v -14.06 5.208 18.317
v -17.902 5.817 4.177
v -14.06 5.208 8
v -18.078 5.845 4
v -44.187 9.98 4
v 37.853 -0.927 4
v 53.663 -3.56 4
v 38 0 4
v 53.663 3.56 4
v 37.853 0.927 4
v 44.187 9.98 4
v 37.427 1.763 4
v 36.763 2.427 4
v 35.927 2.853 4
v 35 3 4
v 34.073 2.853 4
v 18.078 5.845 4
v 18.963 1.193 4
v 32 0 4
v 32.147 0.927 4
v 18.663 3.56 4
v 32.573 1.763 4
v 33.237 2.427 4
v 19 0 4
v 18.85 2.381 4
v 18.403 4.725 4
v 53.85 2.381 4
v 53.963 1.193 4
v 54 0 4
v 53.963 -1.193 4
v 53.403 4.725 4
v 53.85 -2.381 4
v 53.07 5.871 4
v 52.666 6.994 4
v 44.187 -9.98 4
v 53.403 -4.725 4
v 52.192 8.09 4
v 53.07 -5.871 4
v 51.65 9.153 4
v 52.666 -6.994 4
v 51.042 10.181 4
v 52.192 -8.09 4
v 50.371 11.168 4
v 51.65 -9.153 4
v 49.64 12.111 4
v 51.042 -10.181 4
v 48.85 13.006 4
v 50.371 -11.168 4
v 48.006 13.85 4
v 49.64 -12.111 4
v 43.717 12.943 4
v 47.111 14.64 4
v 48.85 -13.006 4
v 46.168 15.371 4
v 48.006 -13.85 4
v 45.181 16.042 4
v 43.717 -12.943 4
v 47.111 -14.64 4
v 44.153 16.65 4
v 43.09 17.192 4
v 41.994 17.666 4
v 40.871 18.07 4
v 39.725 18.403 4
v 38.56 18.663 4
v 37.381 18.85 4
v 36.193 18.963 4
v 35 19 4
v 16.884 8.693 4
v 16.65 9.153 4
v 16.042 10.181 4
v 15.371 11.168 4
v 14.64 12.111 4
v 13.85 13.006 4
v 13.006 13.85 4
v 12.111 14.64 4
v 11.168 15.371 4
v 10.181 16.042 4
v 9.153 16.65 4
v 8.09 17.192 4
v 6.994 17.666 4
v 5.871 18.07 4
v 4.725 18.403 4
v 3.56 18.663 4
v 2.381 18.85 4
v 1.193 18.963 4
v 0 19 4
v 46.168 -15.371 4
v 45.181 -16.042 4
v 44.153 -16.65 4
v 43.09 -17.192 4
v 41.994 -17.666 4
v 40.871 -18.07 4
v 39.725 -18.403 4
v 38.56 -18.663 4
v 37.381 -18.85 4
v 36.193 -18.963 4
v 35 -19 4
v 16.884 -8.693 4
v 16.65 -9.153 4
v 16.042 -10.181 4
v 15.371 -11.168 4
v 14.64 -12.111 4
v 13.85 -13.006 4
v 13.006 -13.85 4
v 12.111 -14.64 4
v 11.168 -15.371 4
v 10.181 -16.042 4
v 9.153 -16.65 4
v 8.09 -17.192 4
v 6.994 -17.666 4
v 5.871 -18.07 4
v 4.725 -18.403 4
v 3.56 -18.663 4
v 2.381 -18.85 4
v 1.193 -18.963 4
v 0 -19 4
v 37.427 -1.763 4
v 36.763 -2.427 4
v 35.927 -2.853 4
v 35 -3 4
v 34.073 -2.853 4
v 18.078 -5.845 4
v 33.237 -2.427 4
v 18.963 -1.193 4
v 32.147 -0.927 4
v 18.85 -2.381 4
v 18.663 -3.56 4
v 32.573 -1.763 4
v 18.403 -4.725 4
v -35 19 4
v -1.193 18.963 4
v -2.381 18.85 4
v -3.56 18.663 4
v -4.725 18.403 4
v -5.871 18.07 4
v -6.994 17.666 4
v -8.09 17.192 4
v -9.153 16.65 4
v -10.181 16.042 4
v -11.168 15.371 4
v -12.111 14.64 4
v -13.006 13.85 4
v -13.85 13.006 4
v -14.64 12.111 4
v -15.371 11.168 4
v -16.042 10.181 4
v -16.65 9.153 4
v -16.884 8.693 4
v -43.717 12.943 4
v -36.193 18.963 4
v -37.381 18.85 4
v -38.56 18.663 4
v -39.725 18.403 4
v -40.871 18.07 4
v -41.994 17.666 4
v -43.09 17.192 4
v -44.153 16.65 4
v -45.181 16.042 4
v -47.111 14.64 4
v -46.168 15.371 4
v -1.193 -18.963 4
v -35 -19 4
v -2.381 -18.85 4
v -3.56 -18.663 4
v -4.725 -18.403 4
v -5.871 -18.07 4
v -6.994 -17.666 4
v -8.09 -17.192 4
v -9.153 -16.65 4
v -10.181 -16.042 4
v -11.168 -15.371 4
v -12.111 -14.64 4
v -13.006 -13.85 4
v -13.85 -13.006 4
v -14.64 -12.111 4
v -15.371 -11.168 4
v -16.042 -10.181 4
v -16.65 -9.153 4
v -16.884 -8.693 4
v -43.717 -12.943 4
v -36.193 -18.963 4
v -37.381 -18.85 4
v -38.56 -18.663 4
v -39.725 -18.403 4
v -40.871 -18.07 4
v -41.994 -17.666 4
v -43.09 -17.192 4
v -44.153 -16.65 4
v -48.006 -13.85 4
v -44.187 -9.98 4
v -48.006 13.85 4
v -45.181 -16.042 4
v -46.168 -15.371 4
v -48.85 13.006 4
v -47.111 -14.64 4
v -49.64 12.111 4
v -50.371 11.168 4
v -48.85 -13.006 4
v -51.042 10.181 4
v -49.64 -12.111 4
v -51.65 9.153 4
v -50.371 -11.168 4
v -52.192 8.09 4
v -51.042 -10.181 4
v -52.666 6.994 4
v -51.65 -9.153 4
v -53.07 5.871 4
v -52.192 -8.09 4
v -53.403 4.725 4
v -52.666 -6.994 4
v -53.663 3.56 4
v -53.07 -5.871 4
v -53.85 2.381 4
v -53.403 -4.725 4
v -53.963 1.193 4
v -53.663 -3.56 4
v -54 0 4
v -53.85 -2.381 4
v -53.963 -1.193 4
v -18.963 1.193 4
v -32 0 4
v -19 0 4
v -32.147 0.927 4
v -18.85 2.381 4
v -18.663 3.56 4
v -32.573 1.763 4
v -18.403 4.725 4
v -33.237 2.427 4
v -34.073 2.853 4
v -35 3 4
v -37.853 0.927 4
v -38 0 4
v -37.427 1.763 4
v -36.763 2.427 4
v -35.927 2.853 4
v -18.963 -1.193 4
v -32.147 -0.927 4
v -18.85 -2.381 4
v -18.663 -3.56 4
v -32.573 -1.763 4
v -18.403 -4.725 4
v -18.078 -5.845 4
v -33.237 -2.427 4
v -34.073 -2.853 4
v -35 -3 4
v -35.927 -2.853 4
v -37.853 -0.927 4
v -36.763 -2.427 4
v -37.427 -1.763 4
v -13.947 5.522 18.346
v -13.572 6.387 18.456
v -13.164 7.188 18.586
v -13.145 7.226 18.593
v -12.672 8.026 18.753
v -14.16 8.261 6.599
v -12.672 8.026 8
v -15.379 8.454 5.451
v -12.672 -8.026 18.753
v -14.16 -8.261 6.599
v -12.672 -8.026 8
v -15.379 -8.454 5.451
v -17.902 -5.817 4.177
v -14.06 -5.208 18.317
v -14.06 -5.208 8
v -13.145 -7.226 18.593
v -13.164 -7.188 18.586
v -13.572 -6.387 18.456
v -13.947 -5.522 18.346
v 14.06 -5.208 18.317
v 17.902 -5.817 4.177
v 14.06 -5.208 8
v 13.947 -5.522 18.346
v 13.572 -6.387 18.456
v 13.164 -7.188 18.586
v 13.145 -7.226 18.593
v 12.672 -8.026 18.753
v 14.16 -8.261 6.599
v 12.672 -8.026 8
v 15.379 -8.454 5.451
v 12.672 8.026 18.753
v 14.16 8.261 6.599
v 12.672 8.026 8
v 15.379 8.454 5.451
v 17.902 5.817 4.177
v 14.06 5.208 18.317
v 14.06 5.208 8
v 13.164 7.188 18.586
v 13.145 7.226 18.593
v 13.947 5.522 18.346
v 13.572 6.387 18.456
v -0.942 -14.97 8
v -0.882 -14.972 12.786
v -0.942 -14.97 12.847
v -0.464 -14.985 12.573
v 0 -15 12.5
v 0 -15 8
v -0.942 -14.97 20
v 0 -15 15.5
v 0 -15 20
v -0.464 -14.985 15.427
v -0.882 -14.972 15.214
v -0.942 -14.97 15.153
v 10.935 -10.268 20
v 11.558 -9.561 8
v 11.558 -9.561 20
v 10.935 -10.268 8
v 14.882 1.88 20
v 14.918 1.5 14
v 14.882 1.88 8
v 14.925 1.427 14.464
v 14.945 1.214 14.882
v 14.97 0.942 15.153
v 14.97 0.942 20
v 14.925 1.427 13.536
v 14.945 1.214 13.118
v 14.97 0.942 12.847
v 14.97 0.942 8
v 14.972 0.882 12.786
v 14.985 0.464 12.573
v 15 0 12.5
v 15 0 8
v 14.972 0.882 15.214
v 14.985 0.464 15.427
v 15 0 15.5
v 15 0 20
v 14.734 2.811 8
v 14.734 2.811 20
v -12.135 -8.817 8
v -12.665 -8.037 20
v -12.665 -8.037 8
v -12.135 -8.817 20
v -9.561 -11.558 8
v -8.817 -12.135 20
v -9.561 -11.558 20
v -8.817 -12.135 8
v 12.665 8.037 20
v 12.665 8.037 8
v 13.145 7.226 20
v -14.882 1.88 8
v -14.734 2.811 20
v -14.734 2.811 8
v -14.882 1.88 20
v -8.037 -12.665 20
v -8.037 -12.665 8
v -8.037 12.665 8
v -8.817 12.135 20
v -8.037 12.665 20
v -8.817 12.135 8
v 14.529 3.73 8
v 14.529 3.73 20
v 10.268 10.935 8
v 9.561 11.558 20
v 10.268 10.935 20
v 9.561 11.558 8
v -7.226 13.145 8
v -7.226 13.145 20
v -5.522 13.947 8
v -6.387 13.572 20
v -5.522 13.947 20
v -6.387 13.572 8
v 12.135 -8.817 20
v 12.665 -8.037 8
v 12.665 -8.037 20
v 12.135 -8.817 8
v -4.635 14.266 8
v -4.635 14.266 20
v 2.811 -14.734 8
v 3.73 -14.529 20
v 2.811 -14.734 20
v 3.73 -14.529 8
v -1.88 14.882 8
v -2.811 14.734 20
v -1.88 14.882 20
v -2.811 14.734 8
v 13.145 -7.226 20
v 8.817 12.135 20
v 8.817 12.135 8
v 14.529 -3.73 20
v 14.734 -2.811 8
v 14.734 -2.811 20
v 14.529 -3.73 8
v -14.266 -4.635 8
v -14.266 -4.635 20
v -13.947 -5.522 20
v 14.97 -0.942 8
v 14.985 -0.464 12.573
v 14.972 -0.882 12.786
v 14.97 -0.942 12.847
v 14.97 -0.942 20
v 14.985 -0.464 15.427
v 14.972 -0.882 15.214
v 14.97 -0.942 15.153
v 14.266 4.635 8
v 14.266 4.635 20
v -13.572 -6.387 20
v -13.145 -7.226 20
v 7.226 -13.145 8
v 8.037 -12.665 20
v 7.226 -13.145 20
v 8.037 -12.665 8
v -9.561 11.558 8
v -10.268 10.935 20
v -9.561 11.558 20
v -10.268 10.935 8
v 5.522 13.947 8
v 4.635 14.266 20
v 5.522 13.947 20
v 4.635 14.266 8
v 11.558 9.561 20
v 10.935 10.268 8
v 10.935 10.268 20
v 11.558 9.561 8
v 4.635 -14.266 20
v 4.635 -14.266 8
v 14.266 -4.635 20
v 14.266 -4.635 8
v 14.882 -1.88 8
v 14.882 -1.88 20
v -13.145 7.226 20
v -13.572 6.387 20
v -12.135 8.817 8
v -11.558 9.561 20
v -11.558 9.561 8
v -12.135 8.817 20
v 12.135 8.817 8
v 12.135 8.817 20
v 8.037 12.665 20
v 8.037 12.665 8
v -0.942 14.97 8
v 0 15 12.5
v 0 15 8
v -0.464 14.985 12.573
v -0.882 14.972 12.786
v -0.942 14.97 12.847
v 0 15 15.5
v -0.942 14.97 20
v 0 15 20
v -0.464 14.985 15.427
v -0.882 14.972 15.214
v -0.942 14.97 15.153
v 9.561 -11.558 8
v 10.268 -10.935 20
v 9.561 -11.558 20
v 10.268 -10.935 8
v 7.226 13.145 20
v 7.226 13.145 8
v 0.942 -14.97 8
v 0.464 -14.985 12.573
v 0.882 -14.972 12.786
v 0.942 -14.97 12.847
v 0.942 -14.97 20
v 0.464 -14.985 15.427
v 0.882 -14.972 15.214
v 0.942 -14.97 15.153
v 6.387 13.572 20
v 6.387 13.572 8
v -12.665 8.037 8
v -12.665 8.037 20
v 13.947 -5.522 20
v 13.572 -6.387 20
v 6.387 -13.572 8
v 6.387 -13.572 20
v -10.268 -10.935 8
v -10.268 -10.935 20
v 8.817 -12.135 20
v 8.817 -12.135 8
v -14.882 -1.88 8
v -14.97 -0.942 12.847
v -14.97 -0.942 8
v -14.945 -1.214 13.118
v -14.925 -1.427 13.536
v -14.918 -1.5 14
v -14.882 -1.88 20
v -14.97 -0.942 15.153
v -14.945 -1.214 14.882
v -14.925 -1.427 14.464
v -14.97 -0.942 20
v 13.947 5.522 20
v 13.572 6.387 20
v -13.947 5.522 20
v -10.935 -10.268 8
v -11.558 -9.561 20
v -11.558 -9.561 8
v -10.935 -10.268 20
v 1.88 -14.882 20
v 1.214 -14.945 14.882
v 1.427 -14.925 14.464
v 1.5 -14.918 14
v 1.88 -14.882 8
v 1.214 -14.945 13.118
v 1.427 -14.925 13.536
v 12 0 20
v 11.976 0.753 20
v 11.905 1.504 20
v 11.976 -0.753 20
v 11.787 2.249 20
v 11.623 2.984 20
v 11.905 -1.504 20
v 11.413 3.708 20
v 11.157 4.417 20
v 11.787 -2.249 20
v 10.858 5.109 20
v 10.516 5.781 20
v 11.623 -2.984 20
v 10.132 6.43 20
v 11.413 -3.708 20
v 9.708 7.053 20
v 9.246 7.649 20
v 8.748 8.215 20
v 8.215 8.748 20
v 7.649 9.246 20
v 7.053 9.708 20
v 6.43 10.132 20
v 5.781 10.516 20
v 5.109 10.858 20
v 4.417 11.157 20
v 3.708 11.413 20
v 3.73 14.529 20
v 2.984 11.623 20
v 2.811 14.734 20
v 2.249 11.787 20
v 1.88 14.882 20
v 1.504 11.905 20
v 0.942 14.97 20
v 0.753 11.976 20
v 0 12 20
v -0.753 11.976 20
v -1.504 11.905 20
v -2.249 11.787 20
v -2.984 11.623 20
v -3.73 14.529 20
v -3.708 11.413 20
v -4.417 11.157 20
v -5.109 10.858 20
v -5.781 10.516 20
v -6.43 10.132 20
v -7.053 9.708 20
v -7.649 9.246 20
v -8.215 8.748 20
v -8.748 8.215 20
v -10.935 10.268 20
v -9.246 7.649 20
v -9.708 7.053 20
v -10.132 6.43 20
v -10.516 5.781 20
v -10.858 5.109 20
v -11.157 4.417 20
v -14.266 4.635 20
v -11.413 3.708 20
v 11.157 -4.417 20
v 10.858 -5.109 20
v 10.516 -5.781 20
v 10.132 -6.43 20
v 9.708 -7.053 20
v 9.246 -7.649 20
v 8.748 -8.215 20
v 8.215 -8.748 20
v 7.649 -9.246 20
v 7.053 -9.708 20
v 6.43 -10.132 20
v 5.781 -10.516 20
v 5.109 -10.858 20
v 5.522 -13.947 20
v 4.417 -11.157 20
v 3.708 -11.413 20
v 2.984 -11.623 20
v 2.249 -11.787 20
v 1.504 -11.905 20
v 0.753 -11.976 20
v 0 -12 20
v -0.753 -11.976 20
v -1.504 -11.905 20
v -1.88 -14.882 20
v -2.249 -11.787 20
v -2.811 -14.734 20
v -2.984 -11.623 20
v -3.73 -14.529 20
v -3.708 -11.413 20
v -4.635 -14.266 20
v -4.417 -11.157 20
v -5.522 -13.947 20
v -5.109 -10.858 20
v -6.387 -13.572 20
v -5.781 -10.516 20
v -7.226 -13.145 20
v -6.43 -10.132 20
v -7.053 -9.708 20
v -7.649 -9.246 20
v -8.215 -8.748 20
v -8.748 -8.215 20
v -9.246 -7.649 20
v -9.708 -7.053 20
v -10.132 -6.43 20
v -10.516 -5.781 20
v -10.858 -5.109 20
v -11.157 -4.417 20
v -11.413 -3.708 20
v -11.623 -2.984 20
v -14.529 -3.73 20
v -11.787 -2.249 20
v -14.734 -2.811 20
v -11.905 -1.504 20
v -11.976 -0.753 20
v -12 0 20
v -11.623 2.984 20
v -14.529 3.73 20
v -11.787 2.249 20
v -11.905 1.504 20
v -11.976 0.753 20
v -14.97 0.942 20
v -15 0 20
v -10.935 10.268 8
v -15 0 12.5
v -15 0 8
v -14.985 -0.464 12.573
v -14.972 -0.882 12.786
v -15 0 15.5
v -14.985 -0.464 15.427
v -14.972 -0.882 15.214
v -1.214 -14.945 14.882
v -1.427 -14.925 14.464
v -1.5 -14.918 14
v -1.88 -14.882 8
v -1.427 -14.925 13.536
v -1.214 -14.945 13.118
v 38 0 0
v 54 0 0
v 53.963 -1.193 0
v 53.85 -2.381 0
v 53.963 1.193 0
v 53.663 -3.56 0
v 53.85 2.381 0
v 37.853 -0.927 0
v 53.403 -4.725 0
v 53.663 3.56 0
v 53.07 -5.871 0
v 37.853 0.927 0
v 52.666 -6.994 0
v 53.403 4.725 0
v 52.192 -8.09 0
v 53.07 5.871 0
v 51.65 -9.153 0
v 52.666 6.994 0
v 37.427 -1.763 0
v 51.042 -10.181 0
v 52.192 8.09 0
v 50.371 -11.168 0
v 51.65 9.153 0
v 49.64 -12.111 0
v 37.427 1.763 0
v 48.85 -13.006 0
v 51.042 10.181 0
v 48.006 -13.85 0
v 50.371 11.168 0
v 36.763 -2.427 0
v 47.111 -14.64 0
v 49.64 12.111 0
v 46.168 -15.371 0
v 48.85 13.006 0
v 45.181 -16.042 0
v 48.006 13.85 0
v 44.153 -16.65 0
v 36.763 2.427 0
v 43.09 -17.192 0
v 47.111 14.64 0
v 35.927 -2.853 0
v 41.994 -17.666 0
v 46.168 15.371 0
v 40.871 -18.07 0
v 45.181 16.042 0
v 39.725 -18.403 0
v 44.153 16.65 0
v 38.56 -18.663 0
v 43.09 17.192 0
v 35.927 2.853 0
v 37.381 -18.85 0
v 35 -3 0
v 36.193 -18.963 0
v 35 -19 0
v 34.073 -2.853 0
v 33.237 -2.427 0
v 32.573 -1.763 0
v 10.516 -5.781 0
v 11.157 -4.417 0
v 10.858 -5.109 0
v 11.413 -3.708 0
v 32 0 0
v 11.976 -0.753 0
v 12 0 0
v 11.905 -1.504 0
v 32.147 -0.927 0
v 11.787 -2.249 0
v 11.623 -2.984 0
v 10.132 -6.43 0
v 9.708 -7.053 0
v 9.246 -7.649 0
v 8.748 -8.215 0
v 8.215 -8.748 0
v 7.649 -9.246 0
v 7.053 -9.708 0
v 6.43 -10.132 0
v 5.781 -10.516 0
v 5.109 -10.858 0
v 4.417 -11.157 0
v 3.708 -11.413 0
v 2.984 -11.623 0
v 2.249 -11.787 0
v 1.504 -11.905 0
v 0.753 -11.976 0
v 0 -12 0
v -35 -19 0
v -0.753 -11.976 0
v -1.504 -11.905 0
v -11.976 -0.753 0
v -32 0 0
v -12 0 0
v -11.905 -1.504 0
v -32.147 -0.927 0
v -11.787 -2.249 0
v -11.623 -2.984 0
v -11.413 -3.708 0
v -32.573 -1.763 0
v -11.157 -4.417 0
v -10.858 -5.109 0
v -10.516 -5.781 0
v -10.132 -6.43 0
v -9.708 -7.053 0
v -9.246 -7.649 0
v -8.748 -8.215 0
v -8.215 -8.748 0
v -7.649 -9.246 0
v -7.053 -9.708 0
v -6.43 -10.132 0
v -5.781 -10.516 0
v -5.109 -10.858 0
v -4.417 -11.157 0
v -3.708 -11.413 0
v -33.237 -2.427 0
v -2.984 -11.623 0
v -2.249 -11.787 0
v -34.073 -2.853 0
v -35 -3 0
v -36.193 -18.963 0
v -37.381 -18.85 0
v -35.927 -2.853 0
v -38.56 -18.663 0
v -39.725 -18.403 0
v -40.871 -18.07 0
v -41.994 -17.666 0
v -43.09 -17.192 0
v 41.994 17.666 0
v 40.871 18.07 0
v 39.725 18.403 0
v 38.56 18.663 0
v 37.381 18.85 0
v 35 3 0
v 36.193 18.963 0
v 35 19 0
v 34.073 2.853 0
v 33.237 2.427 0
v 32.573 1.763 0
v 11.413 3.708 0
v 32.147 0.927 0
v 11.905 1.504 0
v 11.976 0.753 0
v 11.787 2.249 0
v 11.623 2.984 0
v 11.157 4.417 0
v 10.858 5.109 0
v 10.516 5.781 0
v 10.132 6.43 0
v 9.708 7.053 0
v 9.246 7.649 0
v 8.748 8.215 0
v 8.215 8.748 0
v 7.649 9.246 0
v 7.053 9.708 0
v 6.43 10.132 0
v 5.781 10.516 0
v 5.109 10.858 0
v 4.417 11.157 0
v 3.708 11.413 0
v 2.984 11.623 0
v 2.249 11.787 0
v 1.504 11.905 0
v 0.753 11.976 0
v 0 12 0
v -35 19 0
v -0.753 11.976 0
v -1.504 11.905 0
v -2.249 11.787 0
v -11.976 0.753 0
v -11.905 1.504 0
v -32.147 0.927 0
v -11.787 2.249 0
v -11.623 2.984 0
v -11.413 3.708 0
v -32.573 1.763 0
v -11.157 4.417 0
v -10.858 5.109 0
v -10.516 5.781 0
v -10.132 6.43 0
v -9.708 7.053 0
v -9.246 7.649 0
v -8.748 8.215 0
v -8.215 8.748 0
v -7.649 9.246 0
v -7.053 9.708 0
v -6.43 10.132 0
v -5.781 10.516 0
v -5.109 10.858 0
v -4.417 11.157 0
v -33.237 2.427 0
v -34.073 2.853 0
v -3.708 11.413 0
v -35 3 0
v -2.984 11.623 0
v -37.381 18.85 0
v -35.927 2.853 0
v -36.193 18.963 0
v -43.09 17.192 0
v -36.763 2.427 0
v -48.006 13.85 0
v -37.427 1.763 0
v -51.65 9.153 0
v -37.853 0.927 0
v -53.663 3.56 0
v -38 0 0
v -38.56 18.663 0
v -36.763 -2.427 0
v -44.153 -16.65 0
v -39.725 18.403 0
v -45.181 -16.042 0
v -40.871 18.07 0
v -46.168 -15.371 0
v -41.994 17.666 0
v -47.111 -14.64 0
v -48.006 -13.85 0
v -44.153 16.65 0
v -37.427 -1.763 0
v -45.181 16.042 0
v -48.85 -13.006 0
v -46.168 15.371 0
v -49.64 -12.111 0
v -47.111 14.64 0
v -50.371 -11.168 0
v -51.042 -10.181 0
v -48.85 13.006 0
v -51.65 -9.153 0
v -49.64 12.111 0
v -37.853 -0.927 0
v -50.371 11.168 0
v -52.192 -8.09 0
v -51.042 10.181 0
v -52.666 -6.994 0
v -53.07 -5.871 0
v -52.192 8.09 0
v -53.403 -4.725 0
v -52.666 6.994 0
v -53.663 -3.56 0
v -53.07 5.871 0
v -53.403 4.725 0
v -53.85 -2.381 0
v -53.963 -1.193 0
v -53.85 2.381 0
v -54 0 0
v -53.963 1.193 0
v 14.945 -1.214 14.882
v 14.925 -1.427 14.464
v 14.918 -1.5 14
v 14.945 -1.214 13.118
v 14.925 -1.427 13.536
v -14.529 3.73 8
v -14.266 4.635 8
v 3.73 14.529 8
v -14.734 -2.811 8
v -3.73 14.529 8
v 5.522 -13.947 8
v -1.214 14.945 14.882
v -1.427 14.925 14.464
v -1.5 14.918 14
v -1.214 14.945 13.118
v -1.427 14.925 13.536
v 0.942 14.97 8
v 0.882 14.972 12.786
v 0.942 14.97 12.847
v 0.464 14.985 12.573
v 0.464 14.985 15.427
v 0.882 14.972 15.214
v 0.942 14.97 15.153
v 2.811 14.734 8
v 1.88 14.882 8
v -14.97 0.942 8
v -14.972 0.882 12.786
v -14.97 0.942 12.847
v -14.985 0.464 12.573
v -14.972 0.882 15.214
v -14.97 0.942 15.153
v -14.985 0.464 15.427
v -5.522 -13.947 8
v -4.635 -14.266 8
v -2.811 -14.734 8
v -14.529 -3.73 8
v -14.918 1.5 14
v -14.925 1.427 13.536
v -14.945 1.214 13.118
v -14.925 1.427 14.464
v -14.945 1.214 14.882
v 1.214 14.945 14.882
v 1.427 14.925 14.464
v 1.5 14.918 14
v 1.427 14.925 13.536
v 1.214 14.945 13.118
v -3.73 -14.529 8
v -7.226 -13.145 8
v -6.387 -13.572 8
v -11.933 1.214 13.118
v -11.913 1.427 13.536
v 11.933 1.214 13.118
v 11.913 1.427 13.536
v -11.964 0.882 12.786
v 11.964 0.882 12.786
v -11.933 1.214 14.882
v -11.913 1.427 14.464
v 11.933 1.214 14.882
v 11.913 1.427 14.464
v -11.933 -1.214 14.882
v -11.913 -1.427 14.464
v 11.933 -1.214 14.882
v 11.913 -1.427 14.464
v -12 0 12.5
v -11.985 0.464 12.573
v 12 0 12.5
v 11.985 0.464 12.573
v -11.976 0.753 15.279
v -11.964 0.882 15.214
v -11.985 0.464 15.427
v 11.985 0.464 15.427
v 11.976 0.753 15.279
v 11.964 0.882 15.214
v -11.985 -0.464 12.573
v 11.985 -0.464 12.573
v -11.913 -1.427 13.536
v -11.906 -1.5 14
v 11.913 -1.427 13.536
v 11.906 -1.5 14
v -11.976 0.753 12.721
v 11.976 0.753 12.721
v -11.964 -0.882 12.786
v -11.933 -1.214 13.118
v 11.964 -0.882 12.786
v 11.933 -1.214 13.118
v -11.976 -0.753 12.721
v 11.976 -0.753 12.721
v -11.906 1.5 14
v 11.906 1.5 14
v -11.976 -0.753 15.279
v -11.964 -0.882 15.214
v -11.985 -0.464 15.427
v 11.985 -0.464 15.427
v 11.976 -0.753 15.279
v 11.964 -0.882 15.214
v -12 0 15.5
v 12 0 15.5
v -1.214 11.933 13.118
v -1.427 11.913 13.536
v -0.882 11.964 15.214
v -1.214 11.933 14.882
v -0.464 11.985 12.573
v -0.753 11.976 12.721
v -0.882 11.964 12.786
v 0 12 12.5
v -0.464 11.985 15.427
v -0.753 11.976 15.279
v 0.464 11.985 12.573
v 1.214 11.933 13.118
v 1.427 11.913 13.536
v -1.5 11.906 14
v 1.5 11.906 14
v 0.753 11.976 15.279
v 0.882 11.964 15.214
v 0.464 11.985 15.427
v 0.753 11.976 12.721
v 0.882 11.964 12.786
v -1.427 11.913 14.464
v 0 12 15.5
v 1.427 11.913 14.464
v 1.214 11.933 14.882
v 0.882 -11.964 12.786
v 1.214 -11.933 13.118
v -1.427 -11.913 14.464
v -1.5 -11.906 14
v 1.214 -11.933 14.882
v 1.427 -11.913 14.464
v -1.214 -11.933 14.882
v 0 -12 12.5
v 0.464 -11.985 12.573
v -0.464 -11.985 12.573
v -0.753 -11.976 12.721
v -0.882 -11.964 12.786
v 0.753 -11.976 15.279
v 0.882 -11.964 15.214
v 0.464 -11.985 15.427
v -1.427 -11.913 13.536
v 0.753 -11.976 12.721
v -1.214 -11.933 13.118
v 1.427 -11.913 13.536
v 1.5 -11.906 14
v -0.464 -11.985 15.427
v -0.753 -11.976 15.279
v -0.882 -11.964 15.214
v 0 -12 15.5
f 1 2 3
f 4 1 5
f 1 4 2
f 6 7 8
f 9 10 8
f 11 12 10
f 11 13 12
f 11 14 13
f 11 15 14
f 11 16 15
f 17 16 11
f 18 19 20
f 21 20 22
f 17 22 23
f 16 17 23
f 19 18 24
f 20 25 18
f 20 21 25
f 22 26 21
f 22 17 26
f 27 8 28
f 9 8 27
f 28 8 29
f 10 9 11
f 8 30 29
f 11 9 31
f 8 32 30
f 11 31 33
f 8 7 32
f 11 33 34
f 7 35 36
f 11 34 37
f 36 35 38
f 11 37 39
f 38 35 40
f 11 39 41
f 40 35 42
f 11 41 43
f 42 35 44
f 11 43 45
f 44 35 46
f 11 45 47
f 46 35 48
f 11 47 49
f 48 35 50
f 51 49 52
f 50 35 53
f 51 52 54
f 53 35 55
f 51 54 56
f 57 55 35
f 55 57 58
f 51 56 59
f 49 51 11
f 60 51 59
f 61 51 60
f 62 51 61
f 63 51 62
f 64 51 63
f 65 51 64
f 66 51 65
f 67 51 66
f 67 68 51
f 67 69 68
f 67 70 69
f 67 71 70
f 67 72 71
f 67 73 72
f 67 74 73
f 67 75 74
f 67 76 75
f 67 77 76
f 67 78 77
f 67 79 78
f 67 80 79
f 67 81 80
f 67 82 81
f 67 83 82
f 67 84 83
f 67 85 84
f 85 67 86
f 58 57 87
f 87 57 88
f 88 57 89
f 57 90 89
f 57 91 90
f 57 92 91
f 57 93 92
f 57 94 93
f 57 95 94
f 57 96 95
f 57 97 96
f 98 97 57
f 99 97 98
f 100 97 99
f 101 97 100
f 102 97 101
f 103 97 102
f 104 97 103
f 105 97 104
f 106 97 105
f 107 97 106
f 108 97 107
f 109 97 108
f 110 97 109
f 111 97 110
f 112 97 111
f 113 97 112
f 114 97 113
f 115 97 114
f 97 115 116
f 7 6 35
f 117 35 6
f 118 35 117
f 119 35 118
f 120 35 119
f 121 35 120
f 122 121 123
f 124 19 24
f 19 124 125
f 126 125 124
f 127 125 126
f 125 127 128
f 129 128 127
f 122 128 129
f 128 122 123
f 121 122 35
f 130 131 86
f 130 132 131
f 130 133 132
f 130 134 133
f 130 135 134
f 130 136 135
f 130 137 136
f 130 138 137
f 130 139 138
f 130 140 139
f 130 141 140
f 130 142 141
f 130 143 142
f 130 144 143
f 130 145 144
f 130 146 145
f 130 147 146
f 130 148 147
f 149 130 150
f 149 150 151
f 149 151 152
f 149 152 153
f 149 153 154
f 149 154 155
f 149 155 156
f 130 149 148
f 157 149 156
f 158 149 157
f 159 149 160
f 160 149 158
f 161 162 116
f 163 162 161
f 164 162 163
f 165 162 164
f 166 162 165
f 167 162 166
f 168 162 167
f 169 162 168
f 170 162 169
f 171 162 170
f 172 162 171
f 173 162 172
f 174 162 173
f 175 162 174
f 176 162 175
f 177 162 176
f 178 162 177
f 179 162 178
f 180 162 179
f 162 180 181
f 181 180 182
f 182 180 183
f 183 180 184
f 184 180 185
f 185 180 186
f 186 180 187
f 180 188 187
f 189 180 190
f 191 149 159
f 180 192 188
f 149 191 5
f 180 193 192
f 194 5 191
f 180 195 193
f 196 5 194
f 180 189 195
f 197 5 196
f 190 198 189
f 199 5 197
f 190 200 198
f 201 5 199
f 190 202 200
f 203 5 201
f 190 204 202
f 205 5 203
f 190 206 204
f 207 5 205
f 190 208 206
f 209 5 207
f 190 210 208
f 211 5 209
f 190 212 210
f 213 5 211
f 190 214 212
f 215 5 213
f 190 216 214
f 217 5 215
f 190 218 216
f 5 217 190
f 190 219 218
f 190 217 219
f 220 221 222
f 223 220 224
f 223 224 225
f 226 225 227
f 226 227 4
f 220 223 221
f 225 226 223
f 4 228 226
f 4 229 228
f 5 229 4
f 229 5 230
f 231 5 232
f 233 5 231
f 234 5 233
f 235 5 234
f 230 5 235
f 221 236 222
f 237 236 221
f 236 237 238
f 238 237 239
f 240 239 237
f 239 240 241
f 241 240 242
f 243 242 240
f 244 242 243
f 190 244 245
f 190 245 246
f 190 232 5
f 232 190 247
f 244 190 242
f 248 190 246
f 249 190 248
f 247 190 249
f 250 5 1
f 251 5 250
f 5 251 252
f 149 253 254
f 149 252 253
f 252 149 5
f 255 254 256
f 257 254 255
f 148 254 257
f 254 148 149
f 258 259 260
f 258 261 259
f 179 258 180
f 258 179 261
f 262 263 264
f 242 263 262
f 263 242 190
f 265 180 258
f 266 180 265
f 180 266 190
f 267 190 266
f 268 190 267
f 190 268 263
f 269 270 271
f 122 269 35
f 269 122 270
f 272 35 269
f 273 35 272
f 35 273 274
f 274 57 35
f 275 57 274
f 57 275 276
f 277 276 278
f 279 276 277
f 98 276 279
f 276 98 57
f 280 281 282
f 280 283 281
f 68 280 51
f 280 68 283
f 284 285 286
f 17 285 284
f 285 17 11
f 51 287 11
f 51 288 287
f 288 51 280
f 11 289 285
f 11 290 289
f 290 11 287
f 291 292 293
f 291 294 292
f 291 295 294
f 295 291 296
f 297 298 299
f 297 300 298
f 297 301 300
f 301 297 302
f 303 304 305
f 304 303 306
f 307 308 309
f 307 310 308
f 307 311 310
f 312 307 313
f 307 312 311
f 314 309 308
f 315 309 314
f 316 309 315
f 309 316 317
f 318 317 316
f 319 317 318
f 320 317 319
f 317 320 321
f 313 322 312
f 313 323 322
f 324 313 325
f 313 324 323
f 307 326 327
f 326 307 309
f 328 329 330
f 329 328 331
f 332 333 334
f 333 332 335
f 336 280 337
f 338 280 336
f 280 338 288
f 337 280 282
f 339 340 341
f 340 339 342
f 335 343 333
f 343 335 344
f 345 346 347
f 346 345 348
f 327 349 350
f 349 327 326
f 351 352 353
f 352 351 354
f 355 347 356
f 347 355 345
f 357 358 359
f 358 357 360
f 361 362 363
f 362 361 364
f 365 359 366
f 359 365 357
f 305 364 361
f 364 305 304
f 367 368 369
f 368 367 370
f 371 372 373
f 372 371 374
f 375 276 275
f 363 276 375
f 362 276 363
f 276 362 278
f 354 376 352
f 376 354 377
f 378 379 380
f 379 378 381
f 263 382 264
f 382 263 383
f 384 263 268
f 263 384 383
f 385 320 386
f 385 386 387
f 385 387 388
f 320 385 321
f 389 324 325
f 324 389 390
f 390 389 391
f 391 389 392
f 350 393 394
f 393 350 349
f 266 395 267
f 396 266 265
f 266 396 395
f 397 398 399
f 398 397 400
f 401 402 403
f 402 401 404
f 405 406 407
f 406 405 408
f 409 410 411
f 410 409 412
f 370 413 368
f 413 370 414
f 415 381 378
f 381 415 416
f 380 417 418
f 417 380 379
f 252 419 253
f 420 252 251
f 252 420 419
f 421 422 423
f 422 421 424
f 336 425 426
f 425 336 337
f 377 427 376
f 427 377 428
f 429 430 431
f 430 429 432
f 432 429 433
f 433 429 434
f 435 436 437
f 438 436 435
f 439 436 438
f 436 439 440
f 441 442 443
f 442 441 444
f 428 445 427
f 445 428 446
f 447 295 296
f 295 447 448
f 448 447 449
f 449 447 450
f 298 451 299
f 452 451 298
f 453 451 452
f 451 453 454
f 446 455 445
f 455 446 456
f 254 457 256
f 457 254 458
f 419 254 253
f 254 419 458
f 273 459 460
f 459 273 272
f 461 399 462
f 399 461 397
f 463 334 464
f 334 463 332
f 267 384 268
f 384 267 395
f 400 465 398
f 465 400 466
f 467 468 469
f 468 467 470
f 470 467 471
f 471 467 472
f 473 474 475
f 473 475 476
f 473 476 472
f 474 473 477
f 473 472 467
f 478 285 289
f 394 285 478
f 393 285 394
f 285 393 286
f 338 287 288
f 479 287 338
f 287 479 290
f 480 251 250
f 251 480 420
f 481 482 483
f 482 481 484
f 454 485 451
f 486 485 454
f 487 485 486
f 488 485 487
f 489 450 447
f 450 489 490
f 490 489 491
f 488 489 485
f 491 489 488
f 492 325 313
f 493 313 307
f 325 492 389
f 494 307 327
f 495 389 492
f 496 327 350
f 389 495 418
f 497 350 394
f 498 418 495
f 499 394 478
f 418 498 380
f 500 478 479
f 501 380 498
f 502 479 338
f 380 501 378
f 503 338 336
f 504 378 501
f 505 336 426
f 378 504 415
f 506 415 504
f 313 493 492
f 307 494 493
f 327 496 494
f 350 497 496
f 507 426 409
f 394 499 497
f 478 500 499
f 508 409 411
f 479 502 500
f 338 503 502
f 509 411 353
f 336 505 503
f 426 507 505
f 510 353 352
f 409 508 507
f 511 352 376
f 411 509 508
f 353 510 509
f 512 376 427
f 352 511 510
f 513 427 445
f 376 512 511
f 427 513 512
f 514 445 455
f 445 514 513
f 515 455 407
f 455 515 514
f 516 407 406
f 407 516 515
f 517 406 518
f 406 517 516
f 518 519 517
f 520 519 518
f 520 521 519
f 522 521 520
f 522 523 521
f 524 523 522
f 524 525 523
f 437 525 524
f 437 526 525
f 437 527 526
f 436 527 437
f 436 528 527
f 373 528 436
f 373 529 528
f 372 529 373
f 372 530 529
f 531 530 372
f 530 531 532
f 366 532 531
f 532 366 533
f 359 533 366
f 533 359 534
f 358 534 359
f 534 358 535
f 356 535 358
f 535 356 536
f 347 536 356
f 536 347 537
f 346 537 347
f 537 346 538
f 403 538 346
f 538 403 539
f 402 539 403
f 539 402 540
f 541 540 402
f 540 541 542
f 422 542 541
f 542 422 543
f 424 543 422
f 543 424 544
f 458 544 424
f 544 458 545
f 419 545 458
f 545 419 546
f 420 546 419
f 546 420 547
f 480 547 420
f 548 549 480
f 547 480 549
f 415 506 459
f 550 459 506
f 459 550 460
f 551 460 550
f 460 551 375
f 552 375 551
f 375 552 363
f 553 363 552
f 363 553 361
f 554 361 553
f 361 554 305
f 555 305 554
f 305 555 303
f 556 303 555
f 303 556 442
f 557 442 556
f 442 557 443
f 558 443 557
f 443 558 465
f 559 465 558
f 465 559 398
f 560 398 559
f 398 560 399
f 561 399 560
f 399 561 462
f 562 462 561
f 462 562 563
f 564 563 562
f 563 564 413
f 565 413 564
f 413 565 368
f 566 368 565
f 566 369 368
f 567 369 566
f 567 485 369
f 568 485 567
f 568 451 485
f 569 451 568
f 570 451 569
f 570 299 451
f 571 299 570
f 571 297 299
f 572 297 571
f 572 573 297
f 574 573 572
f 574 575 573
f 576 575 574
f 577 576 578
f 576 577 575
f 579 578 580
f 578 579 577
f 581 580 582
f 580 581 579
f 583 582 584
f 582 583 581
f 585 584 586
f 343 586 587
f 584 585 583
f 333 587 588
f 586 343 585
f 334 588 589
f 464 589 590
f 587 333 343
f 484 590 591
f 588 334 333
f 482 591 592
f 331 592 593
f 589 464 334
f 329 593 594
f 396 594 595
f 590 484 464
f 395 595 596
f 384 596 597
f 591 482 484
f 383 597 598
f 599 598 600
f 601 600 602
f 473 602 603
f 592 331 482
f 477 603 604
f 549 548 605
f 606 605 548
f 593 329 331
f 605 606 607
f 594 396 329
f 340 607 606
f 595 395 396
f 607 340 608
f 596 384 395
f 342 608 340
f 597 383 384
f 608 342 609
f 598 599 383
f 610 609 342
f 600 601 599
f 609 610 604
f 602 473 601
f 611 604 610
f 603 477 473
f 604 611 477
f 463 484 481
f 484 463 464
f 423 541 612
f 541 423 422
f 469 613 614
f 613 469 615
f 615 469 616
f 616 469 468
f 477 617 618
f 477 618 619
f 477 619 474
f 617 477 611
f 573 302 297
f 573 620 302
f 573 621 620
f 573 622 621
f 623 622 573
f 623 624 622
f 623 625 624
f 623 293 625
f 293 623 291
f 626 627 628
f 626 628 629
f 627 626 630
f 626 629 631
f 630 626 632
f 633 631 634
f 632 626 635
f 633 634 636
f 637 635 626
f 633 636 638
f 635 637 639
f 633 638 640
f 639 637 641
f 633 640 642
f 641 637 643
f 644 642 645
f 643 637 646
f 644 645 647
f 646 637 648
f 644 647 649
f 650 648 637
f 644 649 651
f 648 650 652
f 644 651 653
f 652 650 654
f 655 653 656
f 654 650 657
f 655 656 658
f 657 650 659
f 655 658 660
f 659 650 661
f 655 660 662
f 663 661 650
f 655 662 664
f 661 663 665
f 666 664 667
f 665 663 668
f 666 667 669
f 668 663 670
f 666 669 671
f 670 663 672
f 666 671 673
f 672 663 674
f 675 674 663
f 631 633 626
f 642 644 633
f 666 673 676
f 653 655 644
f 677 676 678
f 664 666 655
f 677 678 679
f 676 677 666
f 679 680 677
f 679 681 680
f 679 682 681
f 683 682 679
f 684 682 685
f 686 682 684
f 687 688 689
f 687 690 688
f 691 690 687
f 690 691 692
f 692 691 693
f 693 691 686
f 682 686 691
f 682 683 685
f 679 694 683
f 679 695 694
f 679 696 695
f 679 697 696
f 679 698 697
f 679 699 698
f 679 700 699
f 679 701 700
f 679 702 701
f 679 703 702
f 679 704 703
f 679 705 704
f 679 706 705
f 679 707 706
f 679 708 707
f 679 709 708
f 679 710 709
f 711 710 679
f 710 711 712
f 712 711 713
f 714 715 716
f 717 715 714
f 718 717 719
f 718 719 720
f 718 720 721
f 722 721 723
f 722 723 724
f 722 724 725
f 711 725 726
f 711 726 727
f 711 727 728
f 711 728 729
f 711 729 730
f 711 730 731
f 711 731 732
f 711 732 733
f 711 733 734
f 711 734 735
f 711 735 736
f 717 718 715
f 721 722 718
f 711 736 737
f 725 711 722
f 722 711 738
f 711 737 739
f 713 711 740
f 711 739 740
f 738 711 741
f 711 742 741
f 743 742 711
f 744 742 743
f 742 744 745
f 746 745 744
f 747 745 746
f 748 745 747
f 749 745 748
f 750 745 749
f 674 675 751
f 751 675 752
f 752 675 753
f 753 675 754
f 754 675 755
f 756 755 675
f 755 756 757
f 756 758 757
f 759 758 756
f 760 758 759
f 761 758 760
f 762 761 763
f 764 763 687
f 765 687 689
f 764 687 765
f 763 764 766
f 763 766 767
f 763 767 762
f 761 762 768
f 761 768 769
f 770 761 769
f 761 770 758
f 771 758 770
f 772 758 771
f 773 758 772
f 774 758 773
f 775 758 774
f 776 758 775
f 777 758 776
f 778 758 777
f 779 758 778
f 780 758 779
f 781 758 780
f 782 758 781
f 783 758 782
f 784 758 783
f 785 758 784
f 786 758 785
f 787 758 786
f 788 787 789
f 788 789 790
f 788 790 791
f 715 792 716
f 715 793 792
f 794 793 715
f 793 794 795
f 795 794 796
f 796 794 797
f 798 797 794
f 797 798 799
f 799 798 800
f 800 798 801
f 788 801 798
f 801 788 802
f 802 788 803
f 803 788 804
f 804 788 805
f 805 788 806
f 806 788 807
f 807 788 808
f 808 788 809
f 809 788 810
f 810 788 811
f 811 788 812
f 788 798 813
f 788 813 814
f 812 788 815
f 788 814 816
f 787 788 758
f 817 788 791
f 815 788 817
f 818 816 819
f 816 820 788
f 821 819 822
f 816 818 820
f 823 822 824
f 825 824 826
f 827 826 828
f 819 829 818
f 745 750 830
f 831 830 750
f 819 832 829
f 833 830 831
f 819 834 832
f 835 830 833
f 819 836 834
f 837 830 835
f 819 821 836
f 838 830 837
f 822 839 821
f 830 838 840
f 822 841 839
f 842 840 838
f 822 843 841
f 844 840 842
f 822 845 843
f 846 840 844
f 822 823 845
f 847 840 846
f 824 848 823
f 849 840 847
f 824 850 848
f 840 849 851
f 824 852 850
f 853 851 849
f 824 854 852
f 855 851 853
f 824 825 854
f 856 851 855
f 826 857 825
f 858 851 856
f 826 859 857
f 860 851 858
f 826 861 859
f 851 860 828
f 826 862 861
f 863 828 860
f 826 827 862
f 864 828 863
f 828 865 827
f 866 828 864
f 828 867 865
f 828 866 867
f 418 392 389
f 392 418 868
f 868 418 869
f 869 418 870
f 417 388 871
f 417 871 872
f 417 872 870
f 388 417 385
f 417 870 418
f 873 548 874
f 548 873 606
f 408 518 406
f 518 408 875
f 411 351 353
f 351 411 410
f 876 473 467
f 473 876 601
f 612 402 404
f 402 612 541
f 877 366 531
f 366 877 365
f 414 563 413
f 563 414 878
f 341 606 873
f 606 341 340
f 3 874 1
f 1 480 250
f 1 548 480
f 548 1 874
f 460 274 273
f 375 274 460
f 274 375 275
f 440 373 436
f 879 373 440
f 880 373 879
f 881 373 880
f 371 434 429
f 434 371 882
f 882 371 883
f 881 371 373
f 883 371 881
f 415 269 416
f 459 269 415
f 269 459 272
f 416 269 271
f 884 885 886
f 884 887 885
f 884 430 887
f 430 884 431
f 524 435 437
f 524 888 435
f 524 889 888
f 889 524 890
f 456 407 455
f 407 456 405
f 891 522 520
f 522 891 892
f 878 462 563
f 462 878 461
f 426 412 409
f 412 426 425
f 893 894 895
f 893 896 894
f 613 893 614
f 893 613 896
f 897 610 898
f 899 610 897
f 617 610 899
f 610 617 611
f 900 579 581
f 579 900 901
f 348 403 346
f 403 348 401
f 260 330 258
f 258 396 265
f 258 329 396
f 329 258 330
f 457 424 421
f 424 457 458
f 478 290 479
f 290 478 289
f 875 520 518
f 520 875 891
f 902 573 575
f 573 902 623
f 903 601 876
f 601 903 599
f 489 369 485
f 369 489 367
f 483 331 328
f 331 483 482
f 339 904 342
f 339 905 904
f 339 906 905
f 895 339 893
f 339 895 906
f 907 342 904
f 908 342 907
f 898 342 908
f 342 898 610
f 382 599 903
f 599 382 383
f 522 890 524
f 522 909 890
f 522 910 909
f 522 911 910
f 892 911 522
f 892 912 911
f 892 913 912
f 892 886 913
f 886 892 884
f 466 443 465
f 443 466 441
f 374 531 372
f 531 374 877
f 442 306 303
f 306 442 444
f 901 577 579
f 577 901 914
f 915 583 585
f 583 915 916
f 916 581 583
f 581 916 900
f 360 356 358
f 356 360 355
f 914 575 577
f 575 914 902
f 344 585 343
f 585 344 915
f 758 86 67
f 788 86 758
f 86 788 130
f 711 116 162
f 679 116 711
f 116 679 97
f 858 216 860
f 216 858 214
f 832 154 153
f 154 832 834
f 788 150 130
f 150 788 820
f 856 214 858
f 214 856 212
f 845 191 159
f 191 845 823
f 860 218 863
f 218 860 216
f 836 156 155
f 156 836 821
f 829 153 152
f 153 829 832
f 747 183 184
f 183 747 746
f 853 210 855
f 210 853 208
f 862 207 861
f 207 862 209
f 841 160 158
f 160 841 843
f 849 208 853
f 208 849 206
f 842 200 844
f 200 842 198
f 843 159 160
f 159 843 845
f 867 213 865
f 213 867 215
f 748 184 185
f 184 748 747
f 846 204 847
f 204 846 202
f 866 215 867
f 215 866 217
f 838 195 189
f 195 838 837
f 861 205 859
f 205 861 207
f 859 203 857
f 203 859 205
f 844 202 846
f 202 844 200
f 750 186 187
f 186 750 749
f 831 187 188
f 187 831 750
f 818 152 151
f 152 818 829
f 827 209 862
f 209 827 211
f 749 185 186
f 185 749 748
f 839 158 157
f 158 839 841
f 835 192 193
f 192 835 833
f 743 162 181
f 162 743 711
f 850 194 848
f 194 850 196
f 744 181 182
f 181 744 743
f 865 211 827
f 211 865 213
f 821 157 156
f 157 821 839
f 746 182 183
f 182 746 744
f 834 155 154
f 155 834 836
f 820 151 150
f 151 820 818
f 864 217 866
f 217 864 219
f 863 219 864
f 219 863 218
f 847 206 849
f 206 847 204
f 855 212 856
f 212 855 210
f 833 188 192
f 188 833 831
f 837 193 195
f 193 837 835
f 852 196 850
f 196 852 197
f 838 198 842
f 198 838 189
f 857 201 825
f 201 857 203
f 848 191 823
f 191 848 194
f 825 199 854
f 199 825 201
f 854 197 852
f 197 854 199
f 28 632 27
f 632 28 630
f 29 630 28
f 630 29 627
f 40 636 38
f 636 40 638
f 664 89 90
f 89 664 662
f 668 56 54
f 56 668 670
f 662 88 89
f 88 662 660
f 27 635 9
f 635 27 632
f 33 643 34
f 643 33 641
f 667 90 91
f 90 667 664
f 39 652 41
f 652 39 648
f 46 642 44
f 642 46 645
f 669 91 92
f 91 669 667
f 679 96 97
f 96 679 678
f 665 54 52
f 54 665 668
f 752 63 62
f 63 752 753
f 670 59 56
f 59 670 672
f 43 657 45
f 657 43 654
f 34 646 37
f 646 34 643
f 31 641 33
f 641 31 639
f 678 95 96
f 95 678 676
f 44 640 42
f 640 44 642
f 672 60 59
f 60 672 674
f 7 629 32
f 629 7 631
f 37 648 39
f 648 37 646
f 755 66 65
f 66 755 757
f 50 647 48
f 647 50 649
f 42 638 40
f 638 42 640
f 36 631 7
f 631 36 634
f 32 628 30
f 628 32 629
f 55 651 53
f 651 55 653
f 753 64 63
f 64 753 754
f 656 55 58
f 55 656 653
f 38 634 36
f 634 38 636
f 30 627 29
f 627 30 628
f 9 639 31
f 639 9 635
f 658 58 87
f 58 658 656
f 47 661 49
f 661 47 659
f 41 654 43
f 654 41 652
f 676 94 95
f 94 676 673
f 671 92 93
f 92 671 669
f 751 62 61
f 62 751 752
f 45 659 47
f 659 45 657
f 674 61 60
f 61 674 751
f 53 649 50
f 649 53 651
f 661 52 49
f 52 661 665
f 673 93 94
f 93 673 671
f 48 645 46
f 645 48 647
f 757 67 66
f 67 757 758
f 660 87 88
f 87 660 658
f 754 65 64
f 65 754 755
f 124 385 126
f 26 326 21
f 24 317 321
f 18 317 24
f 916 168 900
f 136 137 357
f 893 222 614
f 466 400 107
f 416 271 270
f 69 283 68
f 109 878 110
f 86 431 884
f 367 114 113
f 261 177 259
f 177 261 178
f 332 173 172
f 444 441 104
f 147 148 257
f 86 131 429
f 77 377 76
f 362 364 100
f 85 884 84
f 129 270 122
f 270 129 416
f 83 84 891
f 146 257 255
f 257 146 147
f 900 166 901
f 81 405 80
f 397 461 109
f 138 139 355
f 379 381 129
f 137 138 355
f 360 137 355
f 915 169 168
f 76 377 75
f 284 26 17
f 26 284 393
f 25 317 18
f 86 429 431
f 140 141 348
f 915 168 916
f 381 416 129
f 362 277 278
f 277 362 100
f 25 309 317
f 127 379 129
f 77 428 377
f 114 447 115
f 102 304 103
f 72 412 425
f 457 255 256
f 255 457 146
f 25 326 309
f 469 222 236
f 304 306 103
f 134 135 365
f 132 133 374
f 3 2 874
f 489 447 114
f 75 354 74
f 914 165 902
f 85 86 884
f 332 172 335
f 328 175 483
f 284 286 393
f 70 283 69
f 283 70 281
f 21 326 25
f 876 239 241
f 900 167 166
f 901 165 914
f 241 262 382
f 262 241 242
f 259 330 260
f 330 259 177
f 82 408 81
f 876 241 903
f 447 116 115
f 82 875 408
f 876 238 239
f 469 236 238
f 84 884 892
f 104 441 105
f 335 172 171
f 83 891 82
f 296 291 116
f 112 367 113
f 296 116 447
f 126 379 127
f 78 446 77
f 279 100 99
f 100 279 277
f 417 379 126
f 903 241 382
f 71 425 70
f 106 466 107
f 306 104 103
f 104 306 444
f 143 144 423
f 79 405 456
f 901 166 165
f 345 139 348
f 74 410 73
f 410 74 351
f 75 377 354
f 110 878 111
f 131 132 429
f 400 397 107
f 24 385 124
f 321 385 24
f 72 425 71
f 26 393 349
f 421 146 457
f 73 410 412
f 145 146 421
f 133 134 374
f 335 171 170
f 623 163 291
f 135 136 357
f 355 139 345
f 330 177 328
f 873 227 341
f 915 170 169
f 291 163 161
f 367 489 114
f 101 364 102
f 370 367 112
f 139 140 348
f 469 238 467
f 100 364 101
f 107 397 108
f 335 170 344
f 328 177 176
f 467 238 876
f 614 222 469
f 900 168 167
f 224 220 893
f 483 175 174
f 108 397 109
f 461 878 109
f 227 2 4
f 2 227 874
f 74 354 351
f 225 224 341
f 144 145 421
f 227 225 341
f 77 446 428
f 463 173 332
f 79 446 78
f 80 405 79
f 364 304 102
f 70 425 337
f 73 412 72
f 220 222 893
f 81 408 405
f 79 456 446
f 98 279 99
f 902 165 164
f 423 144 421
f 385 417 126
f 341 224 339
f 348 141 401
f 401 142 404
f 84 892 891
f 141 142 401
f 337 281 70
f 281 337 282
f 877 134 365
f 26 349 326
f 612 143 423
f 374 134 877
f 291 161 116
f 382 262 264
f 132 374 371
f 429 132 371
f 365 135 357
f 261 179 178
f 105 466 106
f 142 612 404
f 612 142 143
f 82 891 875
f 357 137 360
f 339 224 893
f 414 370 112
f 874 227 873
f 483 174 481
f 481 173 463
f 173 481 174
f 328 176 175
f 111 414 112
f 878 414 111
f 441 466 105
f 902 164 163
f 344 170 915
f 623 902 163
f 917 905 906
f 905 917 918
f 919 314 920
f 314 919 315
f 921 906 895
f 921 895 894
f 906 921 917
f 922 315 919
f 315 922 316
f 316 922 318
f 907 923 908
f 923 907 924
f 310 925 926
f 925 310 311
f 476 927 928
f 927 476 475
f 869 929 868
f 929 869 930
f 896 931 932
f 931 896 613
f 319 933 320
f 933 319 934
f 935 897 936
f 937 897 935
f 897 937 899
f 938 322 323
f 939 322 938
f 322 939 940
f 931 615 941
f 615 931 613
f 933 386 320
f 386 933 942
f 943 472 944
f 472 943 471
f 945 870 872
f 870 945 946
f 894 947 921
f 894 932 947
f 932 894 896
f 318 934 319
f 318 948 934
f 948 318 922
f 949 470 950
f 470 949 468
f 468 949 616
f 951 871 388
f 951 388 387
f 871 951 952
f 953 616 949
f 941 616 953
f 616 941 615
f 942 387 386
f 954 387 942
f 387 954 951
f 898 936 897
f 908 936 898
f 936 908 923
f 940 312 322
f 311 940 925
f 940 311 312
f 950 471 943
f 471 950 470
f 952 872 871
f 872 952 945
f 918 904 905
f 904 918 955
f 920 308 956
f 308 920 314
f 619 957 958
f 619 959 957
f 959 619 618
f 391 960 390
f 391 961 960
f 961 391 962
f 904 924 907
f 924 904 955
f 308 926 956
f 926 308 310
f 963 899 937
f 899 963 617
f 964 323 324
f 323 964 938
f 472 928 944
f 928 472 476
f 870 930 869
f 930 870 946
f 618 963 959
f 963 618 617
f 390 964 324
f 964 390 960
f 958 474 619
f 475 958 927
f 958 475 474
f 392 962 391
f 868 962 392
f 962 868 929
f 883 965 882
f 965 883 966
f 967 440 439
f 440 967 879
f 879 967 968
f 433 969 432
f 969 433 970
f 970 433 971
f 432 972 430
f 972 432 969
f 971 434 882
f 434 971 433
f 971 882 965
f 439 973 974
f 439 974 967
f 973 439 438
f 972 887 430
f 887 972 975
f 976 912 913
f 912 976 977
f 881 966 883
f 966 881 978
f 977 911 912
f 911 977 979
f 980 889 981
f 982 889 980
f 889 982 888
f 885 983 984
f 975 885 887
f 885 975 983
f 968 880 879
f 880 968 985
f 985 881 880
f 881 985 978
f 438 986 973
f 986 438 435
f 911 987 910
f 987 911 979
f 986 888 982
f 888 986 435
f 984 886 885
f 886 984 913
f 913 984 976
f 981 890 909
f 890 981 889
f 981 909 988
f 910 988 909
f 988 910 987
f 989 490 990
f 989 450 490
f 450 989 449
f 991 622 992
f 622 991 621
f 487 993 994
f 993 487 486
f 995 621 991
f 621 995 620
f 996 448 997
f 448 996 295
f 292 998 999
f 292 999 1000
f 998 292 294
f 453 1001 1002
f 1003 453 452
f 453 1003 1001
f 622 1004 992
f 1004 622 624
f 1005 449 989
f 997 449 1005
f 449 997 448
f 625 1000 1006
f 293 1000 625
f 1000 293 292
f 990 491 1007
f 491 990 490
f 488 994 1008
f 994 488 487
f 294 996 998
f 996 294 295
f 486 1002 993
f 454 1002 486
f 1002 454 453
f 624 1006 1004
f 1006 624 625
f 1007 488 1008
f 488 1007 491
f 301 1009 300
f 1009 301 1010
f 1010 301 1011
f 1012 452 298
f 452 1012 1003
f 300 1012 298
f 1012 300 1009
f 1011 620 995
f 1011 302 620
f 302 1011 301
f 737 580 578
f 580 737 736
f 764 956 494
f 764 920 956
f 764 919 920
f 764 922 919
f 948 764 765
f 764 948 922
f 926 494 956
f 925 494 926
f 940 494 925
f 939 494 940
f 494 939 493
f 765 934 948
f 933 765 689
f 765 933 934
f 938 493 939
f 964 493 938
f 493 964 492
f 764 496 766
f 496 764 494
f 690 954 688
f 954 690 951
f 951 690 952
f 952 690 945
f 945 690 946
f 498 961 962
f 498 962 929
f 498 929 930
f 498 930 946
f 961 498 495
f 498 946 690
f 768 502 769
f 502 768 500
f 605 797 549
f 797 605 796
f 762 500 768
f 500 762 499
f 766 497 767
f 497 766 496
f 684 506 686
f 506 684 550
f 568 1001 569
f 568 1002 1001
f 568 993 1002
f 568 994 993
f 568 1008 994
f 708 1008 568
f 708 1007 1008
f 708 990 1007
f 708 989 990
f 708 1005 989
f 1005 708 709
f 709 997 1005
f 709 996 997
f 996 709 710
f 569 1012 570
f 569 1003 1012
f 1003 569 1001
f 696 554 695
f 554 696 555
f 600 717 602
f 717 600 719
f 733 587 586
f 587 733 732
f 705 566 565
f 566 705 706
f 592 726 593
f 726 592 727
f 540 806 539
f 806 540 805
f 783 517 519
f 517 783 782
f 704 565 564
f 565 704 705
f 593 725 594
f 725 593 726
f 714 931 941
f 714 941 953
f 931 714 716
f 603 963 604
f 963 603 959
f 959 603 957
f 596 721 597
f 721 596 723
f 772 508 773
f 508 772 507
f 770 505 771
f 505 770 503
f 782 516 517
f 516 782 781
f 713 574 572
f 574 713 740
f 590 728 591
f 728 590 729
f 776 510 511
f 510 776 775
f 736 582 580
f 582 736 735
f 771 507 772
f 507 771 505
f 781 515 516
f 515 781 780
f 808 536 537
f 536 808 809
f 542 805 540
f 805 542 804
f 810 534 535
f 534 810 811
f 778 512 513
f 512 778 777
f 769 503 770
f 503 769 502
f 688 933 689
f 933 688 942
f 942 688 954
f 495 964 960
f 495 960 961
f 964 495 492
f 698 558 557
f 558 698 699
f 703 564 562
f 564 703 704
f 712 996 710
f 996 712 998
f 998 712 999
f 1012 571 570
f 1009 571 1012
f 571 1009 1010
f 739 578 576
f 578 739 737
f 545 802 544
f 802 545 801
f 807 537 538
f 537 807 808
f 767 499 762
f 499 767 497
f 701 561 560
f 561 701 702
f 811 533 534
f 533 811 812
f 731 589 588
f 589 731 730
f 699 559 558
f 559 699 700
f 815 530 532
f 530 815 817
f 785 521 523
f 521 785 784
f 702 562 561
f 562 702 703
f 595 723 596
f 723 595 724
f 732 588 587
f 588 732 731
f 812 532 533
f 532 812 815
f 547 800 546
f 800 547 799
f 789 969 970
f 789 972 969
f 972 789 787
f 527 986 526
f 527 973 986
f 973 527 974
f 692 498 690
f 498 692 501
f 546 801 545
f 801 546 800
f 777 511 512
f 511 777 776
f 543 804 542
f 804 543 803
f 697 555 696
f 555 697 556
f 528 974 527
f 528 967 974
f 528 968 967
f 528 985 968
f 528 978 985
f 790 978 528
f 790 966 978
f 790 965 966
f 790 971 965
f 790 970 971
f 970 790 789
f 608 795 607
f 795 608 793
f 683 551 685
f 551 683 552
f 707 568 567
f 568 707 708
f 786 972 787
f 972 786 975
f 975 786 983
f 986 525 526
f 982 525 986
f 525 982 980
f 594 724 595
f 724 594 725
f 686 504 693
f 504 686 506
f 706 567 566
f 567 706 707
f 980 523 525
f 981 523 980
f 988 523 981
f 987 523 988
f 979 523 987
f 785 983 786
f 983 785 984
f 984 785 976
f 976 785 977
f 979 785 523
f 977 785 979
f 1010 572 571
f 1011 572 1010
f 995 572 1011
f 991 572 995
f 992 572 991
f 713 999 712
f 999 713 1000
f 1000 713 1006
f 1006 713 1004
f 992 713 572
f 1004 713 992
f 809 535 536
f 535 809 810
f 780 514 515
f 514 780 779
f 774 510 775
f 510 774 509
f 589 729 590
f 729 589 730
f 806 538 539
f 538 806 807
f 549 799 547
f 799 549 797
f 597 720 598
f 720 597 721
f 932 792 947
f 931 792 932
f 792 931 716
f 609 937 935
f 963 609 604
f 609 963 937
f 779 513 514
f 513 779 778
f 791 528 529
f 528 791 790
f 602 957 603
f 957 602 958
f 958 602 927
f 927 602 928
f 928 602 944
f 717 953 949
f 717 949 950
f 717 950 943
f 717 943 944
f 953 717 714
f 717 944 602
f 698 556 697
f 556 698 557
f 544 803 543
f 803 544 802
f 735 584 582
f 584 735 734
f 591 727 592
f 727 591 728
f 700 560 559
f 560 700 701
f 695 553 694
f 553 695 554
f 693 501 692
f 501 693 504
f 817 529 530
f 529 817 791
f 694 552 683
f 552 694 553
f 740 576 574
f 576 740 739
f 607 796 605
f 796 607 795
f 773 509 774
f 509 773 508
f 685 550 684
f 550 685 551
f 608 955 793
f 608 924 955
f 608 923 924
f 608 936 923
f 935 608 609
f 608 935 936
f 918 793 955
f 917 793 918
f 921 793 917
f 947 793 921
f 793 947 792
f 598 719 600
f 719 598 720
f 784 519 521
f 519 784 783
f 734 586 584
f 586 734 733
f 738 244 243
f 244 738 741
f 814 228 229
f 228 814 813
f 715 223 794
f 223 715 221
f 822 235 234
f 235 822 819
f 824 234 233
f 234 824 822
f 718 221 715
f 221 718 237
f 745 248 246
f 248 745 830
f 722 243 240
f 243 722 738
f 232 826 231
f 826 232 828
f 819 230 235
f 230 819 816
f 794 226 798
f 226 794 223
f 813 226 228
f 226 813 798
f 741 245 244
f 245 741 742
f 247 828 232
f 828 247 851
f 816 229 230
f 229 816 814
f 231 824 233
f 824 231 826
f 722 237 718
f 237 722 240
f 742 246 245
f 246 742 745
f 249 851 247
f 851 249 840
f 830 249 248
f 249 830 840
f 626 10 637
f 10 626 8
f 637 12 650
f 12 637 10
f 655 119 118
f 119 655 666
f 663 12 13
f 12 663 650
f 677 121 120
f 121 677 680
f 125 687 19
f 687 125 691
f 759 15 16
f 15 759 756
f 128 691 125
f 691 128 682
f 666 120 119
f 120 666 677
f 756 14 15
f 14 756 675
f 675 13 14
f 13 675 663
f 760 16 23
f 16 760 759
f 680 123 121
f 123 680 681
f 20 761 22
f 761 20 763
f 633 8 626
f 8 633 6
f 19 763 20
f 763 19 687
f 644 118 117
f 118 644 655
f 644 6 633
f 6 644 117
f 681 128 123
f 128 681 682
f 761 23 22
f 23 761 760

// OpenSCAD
module scrwthrd(){
//global
lent=100;   //geometry
lenth=20;  //holes
tol=0.1;
//diameters
hlDin=24;
hlDout=30;
scwD=6;
scw2D=3;
tpD=34;

//heigts
hlH=20;
tpH=4;

//sides
flngY = 38;
flngX = 35*2;

color([.5,.7,.7])
difference(){
union(){
    cylinder(h=hlH,r=hlDout/2,$fn=lent);
    translate([-flngX/2,-flngY/2,0]) cube([flngX,flngY,tpH]);
    translate([-flngX/2,0,0]) cylinder(h=tpH,r=flngY/2,$fn=lent);
    translate([flngX/2,0,0]) cylinder(h=tpH,r=flngY/2,$fn=lent);
    translate([0,0,tpH]) cylinder(h=tpH,r1=flngY/2,r2=hlDout/2,$fn=lent);
    for(j=[0:1]){
        rotate([0,0,180*j])
        for(i=[0:1]){
            translate([0,0,tpH])
            translate([0,(hlDout+hlDin)/12*cos(180*i),0])
            rotate([90,0,360*(1.05*(i-0.5))])
            translate([0,0,-(hlDout-hlDin)/4])
            linear_extrude((hlDout-hlDin)/2)
            polygon([[0,0],[(flngX+flngY/2)/2,0],[0,(hlH-tpH)/cos(40)]]);
            }}}
    // less:
    translate([0,0,-tol/2]) cylinder(h=tpH+hlH+tol,r=hlDin/2,$fn=lent);
    translate([-flngX/2,0,-tol/2]) cylinder(h=tpH+hlH+tol,r=scwD/2,$fn=lenth);
    translate([flngX/2,0,-tol/2]) cylinder(h=tpH+hlH+tol,r=scwD/2,$fn=lenth);
    translate([0,0,hlH]) cylinder(h=tpH+hlH,r=hlDout/2,$fn=lent);
    for(i=[0:1:3]){
        rotate([0,90,90*i]) translate([-(hlH+2*tpH)/2,0,0]) cylinder(h=hlDout,r=scw2D/2,$fn=lenth);
        }
    }
}
scrwthrd();
